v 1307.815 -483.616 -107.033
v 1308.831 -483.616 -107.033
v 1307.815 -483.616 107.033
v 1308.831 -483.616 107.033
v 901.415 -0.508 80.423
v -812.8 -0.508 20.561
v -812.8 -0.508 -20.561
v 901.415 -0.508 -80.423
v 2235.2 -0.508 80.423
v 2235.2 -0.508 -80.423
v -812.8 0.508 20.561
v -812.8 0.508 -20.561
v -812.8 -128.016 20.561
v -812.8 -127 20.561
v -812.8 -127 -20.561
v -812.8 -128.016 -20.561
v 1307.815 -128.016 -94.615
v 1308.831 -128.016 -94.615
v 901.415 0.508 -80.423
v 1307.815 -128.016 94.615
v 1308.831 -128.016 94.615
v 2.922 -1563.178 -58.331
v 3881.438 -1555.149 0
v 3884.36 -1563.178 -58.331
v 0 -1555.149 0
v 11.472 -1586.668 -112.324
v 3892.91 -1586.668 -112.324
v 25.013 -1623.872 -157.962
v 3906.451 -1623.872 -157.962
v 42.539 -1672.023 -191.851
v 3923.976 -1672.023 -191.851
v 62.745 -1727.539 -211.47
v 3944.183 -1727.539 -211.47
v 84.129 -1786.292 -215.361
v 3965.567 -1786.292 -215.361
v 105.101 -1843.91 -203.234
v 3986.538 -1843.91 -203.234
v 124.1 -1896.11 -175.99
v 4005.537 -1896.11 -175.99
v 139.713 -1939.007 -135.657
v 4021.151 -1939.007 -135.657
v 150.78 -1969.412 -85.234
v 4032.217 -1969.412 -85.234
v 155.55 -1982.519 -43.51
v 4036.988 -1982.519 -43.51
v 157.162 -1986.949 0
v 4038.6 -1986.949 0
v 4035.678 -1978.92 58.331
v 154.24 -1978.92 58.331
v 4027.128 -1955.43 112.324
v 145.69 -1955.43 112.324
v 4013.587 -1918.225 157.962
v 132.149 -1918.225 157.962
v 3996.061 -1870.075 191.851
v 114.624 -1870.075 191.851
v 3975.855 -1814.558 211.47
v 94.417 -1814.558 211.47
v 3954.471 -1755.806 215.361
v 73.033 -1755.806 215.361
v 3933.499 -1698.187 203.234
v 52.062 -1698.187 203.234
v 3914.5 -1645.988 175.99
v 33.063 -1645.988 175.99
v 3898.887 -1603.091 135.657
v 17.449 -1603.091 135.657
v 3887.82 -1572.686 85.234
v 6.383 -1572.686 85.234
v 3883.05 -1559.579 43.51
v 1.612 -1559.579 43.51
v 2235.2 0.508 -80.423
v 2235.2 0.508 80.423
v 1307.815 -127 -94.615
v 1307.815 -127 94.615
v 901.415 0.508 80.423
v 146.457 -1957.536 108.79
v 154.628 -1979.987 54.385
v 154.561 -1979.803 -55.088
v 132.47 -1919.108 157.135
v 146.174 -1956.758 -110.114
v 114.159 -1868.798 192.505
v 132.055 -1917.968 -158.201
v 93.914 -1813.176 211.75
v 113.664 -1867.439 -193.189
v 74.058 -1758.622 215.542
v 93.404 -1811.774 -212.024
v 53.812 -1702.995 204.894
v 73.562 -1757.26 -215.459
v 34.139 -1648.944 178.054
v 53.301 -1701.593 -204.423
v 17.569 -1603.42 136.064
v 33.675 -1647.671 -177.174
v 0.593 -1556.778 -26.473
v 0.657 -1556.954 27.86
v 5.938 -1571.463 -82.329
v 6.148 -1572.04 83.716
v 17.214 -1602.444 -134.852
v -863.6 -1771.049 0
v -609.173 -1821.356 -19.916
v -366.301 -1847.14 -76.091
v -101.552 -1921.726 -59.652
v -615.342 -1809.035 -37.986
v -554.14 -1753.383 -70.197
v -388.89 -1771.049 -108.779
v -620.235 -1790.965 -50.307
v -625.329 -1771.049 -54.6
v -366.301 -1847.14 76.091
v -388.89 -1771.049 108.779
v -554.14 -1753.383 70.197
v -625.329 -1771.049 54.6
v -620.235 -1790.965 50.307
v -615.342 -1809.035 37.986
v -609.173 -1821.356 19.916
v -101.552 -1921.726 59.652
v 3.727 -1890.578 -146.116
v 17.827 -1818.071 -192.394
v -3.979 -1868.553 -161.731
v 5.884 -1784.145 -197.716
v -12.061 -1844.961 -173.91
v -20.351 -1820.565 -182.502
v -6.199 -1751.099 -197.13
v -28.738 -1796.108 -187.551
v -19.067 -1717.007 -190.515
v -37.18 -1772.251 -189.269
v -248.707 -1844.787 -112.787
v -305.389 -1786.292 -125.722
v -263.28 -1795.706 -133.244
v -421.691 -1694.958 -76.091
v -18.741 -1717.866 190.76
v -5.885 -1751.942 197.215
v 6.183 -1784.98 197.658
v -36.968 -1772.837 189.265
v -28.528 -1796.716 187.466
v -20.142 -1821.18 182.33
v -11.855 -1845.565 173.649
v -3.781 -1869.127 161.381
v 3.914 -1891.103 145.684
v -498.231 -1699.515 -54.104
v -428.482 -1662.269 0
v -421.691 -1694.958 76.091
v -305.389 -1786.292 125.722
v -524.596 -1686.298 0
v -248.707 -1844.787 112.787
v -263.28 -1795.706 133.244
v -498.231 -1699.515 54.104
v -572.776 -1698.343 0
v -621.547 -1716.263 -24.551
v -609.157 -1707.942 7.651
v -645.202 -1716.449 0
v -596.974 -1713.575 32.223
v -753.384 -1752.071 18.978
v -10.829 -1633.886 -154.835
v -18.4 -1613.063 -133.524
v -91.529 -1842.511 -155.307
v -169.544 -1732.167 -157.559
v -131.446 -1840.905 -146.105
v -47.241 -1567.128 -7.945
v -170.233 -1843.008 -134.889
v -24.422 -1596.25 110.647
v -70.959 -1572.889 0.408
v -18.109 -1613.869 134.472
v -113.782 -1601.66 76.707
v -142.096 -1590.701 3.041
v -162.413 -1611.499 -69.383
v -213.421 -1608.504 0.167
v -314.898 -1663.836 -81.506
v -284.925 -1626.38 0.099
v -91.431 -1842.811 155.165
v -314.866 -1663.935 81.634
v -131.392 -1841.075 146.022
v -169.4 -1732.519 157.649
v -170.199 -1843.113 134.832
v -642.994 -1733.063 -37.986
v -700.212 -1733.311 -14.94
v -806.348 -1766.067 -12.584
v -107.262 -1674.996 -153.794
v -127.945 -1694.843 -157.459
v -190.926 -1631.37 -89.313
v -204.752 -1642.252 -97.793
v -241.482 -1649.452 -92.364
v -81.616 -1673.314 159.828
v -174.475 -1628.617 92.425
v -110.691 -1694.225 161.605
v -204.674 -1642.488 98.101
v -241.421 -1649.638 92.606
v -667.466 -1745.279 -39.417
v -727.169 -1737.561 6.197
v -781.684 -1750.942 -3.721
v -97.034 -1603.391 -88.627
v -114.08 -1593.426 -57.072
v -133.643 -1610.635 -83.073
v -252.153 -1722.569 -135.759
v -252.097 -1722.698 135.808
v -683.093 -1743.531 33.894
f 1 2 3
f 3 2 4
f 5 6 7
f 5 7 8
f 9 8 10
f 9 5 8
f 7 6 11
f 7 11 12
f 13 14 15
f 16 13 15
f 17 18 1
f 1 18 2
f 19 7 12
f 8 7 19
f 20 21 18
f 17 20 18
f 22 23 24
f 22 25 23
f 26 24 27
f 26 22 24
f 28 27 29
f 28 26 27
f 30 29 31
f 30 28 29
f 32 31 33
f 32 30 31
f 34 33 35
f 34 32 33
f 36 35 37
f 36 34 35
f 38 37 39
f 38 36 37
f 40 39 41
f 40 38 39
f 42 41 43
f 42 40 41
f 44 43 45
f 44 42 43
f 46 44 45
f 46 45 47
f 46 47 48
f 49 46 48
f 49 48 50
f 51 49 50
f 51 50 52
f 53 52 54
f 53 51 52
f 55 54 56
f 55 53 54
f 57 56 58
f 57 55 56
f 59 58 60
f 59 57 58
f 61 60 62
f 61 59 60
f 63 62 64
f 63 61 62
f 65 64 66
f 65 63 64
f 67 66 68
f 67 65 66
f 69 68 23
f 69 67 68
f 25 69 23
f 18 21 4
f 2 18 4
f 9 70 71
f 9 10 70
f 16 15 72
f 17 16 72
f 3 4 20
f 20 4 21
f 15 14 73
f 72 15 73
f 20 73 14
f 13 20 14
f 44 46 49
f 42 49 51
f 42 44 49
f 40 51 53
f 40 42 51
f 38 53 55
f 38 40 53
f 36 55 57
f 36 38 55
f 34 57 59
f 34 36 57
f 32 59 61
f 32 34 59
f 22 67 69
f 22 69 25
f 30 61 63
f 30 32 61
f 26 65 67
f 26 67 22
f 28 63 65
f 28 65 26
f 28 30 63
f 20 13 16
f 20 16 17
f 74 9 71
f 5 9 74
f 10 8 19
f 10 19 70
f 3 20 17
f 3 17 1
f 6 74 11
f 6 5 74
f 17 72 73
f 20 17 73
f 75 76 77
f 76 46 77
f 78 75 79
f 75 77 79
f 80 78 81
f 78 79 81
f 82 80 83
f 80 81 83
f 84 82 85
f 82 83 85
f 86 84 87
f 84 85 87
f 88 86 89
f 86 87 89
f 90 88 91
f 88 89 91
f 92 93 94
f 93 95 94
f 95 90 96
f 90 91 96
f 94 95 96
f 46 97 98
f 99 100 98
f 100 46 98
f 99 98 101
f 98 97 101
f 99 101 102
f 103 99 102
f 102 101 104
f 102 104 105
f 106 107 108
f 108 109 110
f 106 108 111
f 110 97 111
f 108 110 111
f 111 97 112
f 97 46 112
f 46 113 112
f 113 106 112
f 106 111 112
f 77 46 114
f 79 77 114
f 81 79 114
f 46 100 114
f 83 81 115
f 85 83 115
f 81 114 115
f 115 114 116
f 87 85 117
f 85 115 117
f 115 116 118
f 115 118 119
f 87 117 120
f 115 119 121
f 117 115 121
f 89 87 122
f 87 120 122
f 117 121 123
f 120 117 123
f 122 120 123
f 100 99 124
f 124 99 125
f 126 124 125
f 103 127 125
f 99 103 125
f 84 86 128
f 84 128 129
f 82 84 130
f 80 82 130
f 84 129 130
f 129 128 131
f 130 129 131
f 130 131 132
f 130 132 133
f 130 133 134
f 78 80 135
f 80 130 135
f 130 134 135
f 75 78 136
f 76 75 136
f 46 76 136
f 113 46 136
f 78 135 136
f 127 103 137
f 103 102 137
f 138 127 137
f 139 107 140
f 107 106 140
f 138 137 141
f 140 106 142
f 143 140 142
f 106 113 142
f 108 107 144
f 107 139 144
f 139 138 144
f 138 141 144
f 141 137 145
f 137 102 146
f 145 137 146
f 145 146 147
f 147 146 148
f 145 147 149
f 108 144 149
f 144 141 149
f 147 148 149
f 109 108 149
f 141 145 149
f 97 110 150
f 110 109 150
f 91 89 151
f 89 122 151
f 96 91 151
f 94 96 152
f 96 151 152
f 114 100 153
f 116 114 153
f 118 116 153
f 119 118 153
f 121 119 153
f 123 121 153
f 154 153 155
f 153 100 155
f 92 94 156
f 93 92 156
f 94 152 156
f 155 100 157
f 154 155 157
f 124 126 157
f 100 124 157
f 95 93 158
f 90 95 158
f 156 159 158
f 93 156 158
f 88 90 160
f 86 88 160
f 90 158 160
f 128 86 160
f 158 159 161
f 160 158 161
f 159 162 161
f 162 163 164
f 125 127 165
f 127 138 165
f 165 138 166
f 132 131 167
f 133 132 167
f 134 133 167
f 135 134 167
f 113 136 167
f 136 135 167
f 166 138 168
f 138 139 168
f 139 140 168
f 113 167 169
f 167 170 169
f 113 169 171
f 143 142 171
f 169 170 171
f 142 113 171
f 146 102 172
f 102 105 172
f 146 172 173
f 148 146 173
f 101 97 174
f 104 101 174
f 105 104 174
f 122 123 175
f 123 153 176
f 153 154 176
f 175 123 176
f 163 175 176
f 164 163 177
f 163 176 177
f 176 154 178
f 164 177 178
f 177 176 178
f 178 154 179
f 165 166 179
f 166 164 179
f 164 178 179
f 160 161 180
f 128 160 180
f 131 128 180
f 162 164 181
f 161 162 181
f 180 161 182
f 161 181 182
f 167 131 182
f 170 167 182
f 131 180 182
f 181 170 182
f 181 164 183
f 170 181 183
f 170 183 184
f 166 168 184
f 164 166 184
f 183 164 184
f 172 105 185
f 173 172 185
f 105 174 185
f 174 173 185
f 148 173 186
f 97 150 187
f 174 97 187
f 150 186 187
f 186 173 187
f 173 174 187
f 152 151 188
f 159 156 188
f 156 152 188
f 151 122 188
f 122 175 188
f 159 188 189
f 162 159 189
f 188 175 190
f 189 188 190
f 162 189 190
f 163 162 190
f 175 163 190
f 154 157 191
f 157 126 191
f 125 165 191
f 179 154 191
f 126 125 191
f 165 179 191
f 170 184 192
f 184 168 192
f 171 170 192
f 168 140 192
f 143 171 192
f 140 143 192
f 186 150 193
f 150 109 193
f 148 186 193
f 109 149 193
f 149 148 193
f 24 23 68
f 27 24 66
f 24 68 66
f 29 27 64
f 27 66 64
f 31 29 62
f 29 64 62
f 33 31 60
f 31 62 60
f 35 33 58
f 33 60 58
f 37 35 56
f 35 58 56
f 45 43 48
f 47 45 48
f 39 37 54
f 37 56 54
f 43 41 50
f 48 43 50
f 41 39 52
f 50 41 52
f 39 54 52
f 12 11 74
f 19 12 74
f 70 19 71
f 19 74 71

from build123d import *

# Parameters (mm, degrees)
F0_W     = 406.4
F0_H     = 160.8463985571
F0_W_2   = 355.6
F0_W_3   = 571.7850625672
F1_DEPTH = 0.508
F2_START = 127
F2_DEPTH = 1.016
F3_START = 127
F3_DEPTH = 1.016
F4_ANGLE = 90
F7_DEPTH = 254


with BuildPart() as f1:
    # F0 (on Front) → F1 (new body, symmetric)
    with BuildSketch(Plane.XZ):
        Polygon((901.4149374328, 80.4231992786), (-812.8, 20.5614945892), (-812.8, -20.5614945891), (901.4149374328, -80.4231992786), align=None)
        with Locations((1104.6149374328, 0)):
            Rectangle(F0_W, F0_H)
        with Locations((1485.6149374328, 0)):
            Rectangle(F0_W_2, F0_H)
        with Locations((1949.3074687164, 0)):
            Rectangle(F0_W_3, F0_H)
    extrude(amount=F1_DEPTH, both=True)


with BuildPart() as f2:
    # F0 (on Front) → F2 (new body)
    with BuildSketch(Plane.XZ.offset(F2_START)):
        Polygon((1307.8149374328, -80.4231992786), (901.4149374328, -80.4231992786), (1307.8149374328, -94.615), align=None)
        Polygon((1307.8149374328, 94.615), (901.4149374328, 80.4231992786), (1307.8149374328, 80.4231992786), align=None)
        with Locations((1104.6149374328, 0)):
            Rectangle(F0_W, F0_H)
        Polygon((901.4149374328, 80.4231992786), (-812.8, 20.5614945892), (-812.8, -20.5614945891), (901.4149374328, -80.4231992786), align=None)
    extrude(amount=F2_DEPTH)


with BuildPart() as f3:
    # F0 (on Front) → F3 (new body)
    with BuildSketch(Plane.XZ.offset(F3_START)):
        Polygon((1663.4149374328, 107.0328256313), (1307.8149374328, 94.615), (1307.8149374328, 80.4231992786), (1663.4149374328, 80.4231992786), align=None)
        with Locations((1485.6149374328, 0)):
            Rectangle(F0_W_2, F0_H)
        Polygon((1307.8149374328, -80.4231992786), (1307.8149374328, -94.615), (1663.4149374328, -107.0328256313), (1663.4149374328, -80.4231992786), align=None)
    extrude(amount=F3_DEPTH)


with BuildPart() as f3_1:
    # F4: moved
    add(f3.part.rotate(Axis((1307.8149374328, -128.016, 0), (0, 0, -1)), F4_ANGLE))


with BuildPart() as f6:
    # F5 (on Top) → F6 (revolve)
    with BuildSketch(Plane.XY):
        Polygon((3881.4376528439, -1555.1489124103), (0, -1555.1489124103), (78.5811735781, -1771.0489124103), (3960.0188264219, -1771.0489124103), align=None)
        Polygon((4038.6, -1555.1489124103), (3881.4376528439, -1555.1489124103), (3960.0188264219, -1771.0489124103), (4038.6, -1771.0489124103), align=None)
        Polygon((0, -1555.1489124103), (0, -1771.0489124103), (78.5811735781, -1771.0489124103), align=None)
    revolve(axis=Axis((2019.3, -1771.0489124103, 0), (-1, 0, 0)))

    # F5 (on Top) → F7 (cut, symmetric)
    with BuildSketch(Plane.XY):
        Polygon((78.5811735781, -1771.0489124103), (0, -1771.0489124103), (0, -1986.9489124103), (157.1623471561, -1986.9489124103), align=None)
        Polygon((0, -1555.1489124103), (0, -1771.0489124103), (78.5811735781, -1771.0489124103), align=None)
        Polygon((4038.6, -1555.1489124103), (3881.4376528439, -1555.1489124103), (3960.0188264219, -1771.0489124103), (4038.6, -1771.0489124103), align=None)
        Polygon((4038.6, -1771.0489124103), (3960.0188264219, -1771.0489124103), (4038.6, -1986.9489124103), align=None)
    extrude(amount=F7_DEPTH, both=True, mode=Mode.SUBTRACT)


with BuildPart() as f8:
    # F7_face (on face) → F8 section 0
    with BuildSketch(Plane(origin=(78.5811735781, -1771.0489124103, 0), x_dir=(0.3420201433, -0.9396926208, 0), z_dir=(-0.9396926208, -0.3420201433, 0)), mode=Mode.PRIVATE) as f8_s0:
        with BuildLine():
            add(Edge.make_bspline(
                [(-229.7559810775, 0), (-229.7559810775, 215.9), (0, 215.9), (229.7559810775, 215.9), (229.7559810775, 0)],
                knots=[0, 0, 0, 1.5707963268, 1.5707963268, 3.1415926536, 3.1415926536, 3.1415926536], degree=2, weights=[1, 0.7071067812, 1, 0.7071067812, 1]))
            add(Edge.make_bspline(
                [(229.7559810775, 0), (229.7559810775, -215.9), (0, -215.9), (-229.7559810775, -215.9), (-229.7559810775, 0)],
                knots=[3.1415926536, 3.1415926536, 3.1415926536, 4.7123889804, 4.7123889804, 6.2831853072, 6.2831853072, 6.2831853072], degree=2, weights=[1, 0.7071067812, 1, 0.7071067812, 1]))
        make_face()
    loft([f8_s0.sketch, Vertex(-863.6, -1771.0489124103, 0)])


solid = Compound([f1.part, f2.part, f3_1.part, f6.part, f8.part])
